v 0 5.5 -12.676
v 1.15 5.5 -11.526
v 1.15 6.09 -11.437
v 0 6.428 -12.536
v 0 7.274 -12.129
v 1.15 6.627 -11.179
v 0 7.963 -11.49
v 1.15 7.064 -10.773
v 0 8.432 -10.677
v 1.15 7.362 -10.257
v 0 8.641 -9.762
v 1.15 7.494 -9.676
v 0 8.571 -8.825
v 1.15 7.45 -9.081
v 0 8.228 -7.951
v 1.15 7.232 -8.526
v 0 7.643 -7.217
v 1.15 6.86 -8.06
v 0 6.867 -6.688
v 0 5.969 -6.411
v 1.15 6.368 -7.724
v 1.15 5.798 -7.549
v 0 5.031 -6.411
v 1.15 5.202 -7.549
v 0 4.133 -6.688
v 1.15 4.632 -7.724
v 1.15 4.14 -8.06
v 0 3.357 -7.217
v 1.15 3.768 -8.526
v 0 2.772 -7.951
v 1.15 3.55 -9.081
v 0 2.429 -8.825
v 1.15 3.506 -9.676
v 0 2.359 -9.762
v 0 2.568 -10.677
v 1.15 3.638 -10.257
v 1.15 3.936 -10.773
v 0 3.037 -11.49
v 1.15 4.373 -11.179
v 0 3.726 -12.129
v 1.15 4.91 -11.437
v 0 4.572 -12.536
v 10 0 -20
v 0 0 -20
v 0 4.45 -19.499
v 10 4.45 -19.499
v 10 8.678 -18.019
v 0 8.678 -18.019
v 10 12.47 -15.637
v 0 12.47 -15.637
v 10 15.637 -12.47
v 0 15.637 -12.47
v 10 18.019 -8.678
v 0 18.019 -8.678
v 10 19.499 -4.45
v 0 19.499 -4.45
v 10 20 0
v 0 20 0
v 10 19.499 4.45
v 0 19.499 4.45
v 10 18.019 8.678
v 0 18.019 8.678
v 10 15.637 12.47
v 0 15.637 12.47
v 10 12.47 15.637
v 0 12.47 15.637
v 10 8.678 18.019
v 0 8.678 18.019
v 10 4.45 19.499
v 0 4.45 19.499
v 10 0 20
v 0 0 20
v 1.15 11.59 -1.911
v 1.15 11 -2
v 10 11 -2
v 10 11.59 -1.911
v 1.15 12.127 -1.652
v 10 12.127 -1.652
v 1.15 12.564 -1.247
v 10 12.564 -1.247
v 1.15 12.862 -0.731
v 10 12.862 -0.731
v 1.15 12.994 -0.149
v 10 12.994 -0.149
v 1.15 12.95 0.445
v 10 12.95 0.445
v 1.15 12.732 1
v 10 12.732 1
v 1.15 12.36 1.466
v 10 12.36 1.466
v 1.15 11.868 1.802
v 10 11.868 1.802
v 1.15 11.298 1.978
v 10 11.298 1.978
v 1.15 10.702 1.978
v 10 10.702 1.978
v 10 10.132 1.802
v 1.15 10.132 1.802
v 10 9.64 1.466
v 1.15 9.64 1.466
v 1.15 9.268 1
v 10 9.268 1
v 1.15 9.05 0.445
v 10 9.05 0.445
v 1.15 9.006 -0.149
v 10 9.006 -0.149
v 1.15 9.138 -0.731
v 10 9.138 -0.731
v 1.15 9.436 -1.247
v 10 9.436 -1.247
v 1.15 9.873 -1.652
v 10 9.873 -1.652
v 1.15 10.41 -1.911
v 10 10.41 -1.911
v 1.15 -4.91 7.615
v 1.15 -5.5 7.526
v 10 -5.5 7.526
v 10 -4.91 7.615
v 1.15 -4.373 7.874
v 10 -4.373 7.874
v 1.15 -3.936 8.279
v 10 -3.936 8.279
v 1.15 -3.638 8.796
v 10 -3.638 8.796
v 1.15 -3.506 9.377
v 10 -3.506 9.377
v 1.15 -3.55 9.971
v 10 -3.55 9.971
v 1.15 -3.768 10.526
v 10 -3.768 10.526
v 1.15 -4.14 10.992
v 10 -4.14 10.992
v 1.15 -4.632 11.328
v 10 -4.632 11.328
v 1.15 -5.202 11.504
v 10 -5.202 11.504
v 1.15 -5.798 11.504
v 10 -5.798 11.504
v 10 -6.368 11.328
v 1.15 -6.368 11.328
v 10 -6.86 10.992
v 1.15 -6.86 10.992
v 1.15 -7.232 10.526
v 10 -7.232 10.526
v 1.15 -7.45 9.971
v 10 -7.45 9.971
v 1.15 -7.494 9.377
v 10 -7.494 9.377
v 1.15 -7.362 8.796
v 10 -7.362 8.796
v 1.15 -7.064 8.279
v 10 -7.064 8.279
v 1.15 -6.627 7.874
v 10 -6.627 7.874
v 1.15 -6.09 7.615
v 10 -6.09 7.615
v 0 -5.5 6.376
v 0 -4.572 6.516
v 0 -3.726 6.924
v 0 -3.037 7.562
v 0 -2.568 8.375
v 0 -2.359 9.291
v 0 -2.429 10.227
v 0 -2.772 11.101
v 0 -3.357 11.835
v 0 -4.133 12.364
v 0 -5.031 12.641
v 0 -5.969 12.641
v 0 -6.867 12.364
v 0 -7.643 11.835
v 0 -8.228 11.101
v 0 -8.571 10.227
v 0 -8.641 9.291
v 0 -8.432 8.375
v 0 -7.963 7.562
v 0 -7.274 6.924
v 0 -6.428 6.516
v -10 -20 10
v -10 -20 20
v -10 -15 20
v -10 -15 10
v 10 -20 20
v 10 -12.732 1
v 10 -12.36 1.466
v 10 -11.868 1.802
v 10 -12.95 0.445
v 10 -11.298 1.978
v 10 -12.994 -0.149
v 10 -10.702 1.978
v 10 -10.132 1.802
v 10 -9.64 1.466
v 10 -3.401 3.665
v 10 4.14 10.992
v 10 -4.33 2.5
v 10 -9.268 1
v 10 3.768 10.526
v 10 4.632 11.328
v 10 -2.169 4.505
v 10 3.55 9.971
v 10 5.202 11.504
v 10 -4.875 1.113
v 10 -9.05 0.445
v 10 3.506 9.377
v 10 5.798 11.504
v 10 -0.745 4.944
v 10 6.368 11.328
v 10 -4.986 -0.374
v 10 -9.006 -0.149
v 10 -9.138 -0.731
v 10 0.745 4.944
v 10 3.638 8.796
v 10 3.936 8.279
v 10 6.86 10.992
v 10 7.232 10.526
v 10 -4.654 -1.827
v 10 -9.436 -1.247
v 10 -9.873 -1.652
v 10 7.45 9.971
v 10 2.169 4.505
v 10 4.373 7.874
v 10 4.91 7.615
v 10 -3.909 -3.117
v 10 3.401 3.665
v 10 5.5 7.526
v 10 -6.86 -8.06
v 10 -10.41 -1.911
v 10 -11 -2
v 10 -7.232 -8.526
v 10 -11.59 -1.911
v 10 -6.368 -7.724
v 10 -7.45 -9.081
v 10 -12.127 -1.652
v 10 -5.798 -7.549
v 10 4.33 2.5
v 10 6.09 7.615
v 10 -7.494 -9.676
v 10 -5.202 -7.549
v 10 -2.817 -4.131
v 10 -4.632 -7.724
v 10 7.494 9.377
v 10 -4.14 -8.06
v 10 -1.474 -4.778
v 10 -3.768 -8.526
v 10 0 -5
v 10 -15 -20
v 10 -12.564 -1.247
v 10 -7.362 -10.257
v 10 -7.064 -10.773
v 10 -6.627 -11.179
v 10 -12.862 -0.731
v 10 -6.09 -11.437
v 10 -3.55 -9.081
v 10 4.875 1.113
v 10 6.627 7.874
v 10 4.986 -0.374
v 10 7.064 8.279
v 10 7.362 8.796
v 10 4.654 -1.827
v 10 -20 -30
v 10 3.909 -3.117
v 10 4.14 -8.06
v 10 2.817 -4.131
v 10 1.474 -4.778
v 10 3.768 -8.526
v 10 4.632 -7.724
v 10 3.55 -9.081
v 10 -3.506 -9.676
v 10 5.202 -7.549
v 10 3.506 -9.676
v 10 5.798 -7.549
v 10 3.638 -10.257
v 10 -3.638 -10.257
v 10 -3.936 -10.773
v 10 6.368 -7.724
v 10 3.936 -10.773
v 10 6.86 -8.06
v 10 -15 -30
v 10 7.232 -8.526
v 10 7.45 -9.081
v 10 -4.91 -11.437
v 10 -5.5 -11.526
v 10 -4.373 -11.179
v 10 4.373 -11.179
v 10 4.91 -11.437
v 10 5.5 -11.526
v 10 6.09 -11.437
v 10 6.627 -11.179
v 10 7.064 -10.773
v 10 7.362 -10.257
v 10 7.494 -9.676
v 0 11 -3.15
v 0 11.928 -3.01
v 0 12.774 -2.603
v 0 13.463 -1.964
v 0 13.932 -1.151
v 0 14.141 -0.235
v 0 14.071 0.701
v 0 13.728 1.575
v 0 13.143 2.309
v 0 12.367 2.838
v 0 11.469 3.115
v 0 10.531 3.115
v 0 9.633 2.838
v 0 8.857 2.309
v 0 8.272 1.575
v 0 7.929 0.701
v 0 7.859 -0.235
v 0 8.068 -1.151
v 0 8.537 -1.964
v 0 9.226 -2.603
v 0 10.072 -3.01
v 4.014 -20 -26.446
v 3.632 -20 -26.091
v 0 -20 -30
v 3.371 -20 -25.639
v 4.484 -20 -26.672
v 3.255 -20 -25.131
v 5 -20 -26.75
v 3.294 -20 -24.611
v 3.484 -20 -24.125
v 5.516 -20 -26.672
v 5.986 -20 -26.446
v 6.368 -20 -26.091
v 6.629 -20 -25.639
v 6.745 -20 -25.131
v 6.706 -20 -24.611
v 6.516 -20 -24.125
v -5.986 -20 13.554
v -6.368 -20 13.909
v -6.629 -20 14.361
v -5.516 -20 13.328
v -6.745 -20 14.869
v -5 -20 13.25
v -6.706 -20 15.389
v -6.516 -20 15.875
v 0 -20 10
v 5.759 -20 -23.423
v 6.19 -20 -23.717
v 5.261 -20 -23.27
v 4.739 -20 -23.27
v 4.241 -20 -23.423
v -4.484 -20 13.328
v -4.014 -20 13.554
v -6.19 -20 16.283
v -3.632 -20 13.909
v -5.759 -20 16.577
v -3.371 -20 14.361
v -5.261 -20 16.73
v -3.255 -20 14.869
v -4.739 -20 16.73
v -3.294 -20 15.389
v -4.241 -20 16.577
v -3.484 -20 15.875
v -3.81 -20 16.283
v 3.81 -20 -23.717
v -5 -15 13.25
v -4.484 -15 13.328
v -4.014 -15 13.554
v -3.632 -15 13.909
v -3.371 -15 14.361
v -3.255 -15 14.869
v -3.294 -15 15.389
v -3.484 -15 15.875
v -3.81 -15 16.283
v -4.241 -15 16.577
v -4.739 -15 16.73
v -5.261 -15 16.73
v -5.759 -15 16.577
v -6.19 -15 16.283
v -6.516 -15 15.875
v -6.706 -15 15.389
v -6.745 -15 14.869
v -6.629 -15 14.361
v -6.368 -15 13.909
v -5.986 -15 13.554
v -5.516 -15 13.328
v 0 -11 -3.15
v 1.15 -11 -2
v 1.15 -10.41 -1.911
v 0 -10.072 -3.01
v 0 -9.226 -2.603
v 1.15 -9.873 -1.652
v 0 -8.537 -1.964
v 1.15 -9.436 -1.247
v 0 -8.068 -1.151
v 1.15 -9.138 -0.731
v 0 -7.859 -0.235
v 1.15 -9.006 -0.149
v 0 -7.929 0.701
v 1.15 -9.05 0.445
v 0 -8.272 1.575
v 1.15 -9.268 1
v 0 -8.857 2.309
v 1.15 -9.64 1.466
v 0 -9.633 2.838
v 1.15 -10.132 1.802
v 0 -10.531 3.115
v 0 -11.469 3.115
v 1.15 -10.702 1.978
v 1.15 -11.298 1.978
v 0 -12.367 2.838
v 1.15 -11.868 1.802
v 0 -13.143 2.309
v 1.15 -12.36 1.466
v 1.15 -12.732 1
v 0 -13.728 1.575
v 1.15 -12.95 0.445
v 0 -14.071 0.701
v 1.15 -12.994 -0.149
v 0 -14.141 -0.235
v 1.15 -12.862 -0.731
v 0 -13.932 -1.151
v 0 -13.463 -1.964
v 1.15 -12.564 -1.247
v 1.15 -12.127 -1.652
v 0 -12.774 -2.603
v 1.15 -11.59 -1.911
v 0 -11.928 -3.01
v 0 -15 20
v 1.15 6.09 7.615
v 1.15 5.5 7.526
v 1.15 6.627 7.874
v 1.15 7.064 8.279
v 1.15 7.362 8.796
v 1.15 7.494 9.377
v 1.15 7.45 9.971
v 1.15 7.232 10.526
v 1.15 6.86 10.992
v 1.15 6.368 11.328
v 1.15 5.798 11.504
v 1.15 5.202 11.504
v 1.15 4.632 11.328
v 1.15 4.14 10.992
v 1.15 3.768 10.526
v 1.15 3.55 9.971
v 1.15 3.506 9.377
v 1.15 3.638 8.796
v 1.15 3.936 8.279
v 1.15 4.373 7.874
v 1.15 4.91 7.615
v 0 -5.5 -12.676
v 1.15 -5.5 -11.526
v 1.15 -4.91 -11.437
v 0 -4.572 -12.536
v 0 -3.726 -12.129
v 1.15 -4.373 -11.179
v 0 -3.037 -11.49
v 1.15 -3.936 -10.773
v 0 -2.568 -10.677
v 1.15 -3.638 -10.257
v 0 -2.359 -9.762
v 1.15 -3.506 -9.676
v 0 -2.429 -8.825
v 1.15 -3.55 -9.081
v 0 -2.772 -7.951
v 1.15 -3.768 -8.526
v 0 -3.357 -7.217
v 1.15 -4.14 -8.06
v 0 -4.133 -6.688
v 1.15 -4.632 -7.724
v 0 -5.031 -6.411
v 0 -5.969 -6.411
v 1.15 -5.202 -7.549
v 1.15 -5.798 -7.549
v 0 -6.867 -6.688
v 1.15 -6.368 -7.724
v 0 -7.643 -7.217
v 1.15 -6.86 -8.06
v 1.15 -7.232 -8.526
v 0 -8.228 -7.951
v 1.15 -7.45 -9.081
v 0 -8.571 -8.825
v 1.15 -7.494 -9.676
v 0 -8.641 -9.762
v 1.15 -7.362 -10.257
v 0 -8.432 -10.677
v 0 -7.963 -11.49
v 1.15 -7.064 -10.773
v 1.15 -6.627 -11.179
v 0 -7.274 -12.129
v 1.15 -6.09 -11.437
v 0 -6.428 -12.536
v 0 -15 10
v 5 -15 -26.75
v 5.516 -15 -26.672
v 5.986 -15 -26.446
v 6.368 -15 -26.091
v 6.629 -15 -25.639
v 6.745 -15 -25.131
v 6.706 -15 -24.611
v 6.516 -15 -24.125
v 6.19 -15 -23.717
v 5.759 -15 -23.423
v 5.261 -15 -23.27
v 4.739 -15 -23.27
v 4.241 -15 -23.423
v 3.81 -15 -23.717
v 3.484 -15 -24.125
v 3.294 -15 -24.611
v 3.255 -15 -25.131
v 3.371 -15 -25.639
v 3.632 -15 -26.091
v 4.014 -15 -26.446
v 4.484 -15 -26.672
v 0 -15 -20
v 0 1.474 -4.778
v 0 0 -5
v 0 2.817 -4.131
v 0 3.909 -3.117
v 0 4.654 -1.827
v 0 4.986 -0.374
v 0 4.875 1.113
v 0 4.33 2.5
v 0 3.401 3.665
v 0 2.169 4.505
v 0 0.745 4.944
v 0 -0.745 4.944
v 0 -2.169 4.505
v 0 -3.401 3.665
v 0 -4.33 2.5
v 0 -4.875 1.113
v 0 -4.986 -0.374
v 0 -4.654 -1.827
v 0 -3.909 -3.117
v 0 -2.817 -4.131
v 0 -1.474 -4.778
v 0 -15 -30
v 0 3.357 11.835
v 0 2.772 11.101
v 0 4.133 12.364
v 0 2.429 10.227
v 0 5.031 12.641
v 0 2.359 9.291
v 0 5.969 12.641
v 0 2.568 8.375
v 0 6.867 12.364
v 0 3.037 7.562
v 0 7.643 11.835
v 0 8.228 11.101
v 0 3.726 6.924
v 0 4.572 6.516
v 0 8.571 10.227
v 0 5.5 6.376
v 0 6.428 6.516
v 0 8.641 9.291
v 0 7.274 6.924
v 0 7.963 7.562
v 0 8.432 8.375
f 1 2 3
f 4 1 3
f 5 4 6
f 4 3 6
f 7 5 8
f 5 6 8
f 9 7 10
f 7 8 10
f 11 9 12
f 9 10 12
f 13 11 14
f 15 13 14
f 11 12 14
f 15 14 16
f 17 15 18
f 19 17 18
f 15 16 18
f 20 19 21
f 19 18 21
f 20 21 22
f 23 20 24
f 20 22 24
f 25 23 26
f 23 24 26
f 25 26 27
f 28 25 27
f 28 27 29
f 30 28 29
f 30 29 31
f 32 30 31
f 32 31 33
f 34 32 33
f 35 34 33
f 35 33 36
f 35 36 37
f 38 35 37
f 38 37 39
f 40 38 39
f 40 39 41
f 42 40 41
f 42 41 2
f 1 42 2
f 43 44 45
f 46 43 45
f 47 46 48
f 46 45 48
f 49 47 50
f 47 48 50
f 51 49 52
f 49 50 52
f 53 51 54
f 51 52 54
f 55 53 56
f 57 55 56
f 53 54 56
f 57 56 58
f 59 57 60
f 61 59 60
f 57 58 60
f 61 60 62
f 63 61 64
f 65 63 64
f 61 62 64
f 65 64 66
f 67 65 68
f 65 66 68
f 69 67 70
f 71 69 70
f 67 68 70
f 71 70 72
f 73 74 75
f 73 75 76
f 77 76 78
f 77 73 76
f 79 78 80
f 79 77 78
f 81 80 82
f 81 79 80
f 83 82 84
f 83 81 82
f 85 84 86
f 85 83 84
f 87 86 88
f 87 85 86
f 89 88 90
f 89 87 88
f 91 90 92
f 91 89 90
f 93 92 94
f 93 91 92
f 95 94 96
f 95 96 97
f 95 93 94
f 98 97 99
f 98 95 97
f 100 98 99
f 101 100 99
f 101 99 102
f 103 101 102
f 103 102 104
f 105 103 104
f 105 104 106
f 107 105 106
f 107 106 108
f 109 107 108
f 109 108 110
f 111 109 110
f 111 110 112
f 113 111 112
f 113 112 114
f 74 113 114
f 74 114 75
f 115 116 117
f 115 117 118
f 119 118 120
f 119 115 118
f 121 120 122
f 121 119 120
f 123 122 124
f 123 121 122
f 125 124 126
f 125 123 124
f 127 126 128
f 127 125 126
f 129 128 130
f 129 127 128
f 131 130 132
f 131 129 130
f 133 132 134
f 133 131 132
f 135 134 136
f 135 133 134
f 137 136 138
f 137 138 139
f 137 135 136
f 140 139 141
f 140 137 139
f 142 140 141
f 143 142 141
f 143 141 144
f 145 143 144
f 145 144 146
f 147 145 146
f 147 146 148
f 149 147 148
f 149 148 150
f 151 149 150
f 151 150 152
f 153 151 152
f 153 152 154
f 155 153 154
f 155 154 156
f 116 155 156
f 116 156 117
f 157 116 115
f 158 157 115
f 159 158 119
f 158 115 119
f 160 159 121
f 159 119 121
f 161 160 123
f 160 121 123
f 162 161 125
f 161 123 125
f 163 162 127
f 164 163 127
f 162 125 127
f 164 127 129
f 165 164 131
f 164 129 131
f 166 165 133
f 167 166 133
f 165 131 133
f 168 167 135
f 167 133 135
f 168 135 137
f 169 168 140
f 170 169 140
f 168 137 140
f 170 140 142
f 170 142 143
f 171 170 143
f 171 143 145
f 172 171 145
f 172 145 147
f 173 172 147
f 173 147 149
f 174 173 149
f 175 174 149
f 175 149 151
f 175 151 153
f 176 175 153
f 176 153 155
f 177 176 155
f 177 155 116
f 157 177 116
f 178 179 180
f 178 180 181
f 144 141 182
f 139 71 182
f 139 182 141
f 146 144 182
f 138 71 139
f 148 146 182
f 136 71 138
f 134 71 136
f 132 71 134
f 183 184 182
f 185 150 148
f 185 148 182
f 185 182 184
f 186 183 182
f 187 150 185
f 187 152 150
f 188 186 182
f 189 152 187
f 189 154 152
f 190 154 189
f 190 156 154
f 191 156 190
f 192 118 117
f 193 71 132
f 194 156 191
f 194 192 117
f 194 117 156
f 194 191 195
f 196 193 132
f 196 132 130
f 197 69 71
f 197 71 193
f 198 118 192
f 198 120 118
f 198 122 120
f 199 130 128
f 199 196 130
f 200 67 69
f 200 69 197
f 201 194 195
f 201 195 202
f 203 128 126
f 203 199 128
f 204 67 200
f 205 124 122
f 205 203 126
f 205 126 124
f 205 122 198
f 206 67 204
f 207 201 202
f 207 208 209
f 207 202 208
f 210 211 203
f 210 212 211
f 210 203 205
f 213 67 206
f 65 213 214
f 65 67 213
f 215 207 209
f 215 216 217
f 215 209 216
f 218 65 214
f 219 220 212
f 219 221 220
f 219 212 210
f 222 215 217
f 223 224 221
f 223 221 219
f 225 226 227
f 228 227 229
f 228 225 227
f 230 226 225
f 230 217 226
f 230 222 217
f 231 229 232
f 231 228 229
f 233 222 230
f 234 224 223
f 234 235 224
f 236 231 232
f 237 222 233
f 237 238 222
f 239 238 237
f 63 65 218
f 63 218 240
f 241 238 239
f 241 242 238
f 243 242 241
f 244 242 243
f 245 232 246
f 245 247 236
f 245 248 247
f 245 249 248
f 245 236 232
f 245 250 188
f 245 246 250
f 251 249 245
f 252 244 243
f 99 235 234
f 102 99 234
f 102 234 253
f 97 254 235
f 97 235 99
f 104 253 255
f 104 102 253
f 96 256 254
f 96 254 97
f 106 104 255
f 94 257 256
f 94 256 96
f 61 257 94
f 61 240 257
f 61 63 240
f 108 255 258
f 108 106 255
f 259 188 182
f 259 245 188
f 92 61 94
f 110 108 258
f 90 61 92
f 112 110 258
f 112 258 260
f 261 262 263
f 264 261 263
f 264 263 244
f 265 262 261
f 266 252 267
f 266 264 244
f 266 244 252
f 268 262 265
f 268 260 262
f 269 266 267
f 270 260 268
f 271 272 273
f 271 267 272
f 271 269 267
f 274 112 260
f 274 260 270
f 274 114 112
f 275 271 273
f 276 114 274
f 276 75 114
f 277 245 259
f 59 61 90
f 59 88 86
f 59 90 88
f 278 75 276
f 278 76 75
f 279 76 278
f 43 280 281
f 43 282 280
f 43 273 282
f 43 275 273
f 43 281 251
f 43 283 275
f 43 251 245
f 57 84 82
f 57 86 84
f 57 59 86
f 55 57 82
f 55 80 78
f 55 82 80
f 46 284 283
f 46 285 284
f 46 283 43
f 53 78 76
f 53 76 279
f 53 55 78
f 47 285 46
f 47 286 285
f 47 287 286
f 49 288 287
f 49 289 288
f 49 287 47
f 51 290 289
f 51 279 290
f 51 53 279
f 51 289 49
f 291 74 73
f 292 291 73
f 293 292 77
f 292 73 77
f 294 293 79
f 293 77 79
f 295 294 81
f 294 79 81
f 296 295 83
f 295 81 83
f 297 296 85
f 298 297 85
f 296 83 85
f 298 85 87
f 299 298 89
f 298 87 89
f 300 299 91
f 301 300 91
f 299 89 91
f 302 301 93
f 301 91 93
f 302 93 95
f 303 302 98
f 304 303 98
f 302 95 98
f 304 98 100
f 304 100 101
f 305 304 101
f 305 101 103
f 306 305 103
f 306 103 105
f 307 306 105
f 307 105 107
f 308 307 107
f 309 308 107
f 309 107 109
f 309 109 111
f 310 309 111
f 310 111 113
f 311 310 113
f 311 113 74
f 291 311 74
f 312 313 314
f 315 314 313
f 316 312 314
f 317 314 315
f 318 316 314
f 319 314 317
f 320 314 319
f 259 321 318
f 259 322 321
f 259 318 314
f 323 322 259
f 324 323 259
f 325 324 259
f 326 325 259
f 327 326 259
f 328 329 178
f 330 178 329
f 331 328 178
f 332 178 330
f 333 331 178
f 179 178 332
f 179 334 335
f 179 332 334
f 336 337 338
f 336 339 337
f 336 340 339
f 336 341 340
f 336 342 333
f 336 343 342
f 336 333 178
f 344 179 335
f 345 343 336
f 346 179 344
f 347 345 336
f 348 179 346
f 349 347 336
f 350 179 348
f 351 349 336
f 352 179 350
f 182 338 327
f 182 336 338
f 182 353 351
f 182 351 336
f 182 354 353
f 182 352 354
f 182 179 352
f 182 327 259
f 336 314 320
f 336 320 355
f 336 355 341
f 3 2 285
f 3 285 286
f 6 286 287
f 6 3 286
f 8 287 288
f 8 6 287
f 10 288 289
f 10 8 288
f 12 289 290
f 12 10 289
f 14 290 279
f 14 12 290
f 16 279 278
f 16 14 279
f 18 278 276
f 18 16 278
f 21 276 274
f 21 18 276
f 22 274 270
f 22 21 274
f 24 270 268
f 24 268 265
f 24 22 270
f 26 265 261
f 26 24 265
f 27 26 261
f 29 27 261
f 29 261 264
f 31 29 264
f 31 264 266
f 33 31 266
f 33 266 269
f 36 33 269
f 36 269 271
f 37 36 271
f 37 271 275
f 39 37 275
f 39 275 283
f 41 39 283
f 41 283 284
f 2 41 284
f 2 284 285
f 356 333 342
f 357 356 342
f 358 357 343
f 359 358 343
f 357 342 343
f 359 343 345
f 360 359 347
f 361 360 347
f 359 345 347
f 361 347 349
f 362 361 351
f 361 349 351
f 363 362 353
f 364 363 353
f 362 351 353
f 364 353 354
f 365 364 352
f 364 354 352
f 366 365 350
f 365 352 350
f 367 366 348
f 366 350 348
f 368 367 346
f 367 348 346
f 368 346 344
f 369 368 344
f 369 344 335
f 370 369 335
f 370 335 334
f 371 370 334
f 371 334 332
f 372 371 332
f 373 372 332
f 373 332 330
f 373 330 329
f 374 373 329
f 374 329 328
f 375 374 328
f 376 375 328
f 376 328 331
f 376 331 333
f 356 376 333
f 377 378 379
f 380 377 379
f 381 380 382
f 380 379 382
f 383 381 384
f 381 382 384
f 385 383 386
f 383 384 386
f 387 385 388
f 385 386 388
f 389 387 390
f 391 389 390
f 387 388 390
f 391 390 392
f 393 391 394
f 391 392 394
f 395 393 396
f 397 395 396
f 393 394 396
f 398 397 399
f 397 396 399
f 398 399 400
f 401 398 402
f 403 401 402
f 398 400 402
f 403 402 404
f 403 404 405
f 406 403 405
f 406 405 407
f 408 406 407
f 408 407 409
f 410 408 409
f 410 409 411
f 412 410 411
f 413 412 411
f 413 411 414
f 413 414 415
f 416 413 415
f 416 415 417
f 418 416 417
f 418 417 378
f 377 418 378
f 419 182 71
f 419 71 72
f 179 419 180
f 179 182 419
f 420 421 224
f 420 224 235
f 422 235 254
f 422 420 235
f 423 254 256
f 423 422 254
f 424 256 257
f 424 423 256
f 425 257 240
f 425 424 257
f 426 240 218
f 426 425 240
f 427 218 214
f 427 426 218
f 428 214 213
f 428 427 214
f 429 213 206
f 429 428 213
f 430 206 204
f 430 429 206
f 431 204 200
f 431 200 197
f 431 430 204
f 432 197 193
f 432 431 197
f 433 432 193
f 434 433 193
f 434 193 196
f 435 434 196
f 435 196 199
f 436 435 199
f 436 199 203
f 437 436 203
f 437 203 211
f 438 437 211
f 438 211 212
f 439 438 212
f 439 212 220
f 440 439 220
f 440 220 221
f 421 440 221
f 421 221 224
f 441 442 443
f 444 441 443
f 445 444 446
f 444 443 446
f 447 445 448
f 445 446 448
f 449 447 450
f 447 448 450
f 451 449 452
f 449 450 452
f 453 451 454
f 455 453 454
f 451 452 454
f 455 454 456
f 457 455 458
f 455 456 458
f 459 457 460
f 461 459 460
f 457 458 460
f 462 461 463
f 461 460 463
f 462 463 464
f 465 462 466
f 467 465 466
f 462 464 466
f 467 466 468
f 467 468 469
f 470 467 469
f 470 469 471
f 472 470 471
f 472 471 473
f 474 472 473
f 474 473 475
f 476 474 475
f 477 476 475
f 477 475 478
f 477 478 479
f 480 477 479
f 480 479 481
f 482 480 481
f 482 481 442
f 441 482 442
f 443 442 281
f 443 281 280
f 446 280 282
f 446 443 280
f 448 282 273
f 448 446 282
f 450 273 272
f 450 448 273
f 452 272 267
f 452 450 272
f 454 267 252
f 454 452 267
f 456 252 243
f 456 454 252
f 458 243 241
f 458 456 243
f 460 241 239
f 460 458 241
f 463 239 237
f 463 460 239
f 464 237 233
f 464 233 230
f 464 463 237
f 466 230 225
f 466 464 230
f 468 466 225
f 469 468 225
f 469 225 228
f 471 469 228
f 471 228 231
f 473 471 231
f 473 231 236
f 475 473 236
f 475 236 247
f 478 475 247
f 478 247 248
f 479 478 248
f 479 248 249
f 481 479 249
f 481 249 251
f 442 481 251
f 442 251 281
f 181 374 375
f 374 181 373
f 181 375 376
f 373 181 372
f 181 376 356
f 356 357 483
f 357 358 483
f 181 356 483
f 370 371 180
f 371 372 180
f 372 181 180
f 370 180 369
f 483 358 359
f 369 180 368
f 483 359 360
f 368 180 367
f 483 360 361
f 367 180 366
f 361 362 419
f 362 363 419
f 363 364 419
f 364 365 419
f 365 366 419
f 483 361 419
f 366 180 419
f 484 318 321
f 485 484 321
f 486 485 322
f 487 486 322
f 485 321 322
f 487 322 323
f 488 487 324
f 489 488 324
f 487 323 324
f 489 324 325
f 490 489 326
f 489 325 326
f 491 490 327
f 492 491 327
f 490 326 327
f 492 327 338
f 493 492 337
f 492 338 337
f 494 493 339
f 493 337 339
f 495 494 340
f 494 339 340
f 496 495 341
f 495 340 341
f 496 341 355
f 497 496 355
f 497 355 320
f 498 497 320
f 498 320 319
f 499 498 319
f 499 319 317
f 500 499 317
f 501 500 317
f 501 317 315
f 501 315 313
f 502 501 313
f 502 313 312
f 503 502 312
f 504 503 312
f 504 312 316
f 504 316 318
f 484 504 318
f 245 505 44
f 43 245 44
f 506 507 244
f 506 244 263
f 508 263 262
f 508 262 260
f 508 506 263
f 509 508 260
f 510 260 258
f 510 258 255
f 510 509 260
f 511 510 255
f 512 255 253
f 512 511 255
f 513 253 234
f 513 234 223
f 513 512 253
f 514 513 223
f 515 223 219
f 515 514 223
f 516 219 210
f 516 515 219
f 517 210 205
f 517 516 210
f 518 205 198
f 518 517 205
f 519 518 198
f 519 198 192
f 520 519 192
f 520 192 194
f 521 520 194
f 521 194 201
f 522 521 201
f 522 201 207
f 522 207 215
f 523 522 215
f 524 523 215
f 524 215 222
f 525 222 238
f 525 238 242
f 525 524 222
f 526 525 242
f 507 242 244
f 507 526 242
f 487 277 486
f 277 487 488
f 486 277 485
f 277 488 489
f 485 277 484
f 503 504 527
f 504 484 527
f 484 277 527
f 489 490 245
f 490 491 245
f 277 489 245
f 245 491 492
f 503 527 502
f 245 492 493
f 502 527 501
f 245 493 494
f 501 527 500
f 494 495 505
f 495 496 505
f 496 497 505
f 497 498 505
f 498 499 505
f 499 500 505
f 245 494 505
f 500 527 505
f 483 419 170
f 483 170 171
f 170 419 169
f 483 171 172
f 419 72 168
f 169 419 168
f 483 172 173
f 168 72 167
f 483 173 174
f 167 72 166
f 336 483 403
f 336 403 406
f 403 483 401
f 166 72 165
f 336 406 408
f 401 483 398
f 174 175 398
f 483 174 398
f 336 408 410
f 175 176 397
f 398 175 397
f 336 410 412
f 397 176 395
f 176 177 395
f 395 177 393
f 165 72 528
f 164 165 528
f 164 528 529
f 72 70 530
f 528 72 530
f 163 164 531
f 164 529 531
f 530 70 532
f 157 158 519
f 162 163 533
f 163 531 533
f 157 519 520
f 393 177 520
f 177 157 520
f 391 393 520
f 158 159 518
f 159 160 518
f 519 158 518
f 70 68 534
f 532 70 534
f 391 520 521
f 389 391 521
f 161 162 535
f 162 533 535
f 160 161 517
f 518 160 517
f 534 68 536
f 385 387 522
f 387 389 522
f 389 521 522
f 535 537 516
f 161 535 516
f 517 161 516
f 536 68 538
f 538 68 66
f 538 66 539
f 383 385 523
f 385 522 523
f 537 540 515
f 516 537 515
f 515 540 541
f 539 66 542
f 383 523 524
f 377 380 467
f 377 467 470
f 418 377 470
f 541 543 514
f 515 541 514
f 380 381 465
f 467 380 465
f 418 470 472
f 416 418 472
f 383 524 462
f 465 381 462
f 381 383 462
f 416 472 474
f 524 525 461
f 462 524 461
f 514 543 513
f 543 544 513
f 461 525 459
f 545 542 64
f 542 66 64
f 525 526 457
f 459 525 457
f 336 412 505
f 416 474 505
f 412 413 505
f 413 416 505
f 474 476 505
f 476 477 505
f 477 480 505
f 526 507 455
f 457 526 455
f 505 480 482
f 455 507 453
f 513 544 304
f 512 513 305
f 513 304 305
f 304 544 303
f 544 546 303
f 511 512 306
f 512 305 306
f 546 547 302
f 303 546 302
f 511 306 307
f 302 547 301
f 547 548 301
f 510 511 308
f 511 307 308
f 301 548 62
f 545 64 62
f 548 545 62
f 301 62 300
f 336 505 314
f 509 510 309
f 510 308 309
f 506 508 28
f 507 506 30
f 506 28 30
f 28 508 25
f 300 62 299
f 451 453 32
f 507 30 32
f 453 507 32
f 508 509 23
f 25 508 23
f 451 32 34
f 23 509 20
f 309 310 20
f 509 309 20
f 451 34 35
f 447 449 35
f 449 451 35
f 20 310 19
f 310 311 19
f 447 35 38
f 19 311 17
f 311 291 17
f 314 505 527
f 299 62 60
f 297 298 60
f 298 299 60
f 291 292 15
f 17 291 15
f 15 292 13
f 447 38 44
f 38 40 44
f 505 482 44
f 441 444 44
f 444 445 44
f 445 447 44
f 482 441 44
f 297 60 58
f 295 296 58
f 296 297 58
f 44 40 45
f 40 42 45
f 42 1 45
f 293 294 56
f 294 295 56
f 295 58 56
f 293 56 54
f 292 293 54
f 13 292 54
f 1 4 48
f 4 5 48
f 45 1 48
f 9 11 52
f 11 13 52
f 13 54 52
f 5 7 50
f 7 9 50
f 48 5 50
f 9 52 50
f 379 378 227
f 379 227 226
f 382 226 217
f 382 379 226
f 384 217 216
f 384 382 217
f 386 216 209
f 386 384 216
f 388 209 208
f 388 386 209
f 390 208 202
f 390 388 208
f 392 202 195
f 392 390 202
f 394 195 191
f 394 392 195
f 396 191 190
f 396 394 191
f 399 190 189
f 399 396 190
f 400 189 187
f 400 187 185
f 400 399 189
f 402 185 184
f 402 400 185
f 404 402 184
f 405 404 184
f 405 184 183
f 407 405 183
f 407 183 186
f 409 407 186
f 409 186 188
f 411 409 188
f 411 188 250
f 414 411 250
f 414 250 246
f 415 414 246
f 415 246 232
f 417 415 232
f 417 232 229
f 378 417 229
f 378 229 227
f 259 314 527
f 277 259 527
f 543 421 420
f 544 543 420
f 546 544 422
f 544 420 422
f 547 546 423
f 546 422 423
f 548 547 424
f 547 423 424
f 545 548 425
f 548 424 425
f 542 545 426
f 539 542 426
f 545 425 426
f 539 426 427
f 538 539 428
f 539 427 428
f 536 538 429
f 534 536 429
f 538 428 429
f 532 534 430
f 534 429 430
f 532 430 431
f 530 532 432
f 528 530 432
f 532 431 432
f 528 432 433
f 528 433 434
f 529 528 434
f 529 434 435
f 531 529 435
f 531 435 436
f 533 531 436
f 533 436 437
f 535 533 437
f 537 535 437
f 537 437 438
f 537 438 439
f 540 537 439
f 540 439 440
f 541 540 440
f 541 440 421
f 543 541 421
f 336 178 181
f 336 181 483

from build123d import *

# Parameters (mm, degrees)
SKETCH1_R                                       = 2
SKETCH1_R_2                                     = 5
BOSS_EXTRUDE1_DEPTH                             = 10
CSK_FOR_M3_FLAT_HEAD_MACHINE_SCREW1_D           = 3.4
CSK_FOR_M3_FLAT_HEAD_MACHINE_SCREW1_CSINK_D     = 6.3
CSK_FOR_M3_FLAT_HEAD_MACHINE_SCREW1_CSINK_ANGLE = 90
BOSS_EXTRUDE2_DEPTH                             = 5
F_3_0MM_DOWEL_HOLE1_D                           = 3.5


with BuildPart() as part:
    # Sketch1 → Boss-Extrude1 (new body)
    with BuildSketch(Plane(origin=(0, 0, 0), x_dir=(0, 0, -1), z_dir=(1, 0, 0))):
        with BuildLine():
            Line((30, -15), (20, -15))
            Line((20, -15), (20, 0))
            ThreePointArc((20, 0), (0, 20), (-20, 0))
            Line((-20, 0), (-20, -15))
            Line((-20, -15), (-20, -20))
            Line((-20, -20), (-15.856579477, -20))
            Line((-15.856579477, -20), (9.951007048, -20))
            Line((9.951007048, -20), (17.640087429, -20))
            Line((17.640087429, -20), (30, -20))
            Line((30, -20), (30, -15))
        make_face()
        with Locations((-9.526279442, -5.5)):
            Circle(SKETCH1_R, mode=Mode.SUBTRACT)
        with Locations((0, -11)):
            Circle(SKETCH1_R, mode=Mode.SUBTRACT)
        with Locations((9.526279442, -5.5)):
            Circle(SKETCH1_R, mode=Mode.SUBTRACT)
        with Locations((-9.526279442, 5.5)):
            Circle(SKETCH1_R, mode=Mode.SUBTRACT)
        Circle(SKETCH1_R_2, mode=Mode.SUBTRACT)
        with Locations((9.526279442, 5.5)):
            Circle(SKETCH1_R, mode=Mode.SUBTRACT)
        with Locations((0, 11)):
            Circle(SKETCH1_R, mode=Mode.SUBTRACT)
    extrude(amount=BOSS_EXTRUDE1_DEPTH)

    # CSK for M3 Flat Head Machine Screw1 (through all)
    with Locations(Plane.ZY):
        with Locations((0, 11), (9.526279442, 5.5), (9.526279442, -5.5), (0, -11), (-9.526279442, -5.5), (-9.526279442, 5.5)):
            CounterSinkHole(CSK_FOR_M3_FLAT_HEAD_MACHINE_SCREW1_D / 2, CSK_FOR_M3_FLAT_HEAD_MACHINE_SCREW1_CSINK_D / 2, counter_sink_angle=CSK_FOR_M3_FLAT_HEAD_MACHINE_SCREW1_CSINK_ANGLE)

    # Sketch6 → Boss-Extrude2 (add)
    with BuildSketch(Plane.XZ.offset(20)):
        Polygon((0, 20), (-10, 20), (-10, 10), (0, 10), (10, 10), (10, 20), align=None)
    extrude(amount=-BOSS_EXTRUDE2_DEPTH)

    # Ø3.0mm Dowel Hole1 (through all)
    with Locations(Plane(origin=(5, -15, -25), x_dir=(0, 0, 1), z_dir=(0, 1, 0))):
        with Locations((0, 0), (40, -10)):
            Hole(F_3_0MM_DOWEL_HOLE1_D / 2)


solid = part.part
